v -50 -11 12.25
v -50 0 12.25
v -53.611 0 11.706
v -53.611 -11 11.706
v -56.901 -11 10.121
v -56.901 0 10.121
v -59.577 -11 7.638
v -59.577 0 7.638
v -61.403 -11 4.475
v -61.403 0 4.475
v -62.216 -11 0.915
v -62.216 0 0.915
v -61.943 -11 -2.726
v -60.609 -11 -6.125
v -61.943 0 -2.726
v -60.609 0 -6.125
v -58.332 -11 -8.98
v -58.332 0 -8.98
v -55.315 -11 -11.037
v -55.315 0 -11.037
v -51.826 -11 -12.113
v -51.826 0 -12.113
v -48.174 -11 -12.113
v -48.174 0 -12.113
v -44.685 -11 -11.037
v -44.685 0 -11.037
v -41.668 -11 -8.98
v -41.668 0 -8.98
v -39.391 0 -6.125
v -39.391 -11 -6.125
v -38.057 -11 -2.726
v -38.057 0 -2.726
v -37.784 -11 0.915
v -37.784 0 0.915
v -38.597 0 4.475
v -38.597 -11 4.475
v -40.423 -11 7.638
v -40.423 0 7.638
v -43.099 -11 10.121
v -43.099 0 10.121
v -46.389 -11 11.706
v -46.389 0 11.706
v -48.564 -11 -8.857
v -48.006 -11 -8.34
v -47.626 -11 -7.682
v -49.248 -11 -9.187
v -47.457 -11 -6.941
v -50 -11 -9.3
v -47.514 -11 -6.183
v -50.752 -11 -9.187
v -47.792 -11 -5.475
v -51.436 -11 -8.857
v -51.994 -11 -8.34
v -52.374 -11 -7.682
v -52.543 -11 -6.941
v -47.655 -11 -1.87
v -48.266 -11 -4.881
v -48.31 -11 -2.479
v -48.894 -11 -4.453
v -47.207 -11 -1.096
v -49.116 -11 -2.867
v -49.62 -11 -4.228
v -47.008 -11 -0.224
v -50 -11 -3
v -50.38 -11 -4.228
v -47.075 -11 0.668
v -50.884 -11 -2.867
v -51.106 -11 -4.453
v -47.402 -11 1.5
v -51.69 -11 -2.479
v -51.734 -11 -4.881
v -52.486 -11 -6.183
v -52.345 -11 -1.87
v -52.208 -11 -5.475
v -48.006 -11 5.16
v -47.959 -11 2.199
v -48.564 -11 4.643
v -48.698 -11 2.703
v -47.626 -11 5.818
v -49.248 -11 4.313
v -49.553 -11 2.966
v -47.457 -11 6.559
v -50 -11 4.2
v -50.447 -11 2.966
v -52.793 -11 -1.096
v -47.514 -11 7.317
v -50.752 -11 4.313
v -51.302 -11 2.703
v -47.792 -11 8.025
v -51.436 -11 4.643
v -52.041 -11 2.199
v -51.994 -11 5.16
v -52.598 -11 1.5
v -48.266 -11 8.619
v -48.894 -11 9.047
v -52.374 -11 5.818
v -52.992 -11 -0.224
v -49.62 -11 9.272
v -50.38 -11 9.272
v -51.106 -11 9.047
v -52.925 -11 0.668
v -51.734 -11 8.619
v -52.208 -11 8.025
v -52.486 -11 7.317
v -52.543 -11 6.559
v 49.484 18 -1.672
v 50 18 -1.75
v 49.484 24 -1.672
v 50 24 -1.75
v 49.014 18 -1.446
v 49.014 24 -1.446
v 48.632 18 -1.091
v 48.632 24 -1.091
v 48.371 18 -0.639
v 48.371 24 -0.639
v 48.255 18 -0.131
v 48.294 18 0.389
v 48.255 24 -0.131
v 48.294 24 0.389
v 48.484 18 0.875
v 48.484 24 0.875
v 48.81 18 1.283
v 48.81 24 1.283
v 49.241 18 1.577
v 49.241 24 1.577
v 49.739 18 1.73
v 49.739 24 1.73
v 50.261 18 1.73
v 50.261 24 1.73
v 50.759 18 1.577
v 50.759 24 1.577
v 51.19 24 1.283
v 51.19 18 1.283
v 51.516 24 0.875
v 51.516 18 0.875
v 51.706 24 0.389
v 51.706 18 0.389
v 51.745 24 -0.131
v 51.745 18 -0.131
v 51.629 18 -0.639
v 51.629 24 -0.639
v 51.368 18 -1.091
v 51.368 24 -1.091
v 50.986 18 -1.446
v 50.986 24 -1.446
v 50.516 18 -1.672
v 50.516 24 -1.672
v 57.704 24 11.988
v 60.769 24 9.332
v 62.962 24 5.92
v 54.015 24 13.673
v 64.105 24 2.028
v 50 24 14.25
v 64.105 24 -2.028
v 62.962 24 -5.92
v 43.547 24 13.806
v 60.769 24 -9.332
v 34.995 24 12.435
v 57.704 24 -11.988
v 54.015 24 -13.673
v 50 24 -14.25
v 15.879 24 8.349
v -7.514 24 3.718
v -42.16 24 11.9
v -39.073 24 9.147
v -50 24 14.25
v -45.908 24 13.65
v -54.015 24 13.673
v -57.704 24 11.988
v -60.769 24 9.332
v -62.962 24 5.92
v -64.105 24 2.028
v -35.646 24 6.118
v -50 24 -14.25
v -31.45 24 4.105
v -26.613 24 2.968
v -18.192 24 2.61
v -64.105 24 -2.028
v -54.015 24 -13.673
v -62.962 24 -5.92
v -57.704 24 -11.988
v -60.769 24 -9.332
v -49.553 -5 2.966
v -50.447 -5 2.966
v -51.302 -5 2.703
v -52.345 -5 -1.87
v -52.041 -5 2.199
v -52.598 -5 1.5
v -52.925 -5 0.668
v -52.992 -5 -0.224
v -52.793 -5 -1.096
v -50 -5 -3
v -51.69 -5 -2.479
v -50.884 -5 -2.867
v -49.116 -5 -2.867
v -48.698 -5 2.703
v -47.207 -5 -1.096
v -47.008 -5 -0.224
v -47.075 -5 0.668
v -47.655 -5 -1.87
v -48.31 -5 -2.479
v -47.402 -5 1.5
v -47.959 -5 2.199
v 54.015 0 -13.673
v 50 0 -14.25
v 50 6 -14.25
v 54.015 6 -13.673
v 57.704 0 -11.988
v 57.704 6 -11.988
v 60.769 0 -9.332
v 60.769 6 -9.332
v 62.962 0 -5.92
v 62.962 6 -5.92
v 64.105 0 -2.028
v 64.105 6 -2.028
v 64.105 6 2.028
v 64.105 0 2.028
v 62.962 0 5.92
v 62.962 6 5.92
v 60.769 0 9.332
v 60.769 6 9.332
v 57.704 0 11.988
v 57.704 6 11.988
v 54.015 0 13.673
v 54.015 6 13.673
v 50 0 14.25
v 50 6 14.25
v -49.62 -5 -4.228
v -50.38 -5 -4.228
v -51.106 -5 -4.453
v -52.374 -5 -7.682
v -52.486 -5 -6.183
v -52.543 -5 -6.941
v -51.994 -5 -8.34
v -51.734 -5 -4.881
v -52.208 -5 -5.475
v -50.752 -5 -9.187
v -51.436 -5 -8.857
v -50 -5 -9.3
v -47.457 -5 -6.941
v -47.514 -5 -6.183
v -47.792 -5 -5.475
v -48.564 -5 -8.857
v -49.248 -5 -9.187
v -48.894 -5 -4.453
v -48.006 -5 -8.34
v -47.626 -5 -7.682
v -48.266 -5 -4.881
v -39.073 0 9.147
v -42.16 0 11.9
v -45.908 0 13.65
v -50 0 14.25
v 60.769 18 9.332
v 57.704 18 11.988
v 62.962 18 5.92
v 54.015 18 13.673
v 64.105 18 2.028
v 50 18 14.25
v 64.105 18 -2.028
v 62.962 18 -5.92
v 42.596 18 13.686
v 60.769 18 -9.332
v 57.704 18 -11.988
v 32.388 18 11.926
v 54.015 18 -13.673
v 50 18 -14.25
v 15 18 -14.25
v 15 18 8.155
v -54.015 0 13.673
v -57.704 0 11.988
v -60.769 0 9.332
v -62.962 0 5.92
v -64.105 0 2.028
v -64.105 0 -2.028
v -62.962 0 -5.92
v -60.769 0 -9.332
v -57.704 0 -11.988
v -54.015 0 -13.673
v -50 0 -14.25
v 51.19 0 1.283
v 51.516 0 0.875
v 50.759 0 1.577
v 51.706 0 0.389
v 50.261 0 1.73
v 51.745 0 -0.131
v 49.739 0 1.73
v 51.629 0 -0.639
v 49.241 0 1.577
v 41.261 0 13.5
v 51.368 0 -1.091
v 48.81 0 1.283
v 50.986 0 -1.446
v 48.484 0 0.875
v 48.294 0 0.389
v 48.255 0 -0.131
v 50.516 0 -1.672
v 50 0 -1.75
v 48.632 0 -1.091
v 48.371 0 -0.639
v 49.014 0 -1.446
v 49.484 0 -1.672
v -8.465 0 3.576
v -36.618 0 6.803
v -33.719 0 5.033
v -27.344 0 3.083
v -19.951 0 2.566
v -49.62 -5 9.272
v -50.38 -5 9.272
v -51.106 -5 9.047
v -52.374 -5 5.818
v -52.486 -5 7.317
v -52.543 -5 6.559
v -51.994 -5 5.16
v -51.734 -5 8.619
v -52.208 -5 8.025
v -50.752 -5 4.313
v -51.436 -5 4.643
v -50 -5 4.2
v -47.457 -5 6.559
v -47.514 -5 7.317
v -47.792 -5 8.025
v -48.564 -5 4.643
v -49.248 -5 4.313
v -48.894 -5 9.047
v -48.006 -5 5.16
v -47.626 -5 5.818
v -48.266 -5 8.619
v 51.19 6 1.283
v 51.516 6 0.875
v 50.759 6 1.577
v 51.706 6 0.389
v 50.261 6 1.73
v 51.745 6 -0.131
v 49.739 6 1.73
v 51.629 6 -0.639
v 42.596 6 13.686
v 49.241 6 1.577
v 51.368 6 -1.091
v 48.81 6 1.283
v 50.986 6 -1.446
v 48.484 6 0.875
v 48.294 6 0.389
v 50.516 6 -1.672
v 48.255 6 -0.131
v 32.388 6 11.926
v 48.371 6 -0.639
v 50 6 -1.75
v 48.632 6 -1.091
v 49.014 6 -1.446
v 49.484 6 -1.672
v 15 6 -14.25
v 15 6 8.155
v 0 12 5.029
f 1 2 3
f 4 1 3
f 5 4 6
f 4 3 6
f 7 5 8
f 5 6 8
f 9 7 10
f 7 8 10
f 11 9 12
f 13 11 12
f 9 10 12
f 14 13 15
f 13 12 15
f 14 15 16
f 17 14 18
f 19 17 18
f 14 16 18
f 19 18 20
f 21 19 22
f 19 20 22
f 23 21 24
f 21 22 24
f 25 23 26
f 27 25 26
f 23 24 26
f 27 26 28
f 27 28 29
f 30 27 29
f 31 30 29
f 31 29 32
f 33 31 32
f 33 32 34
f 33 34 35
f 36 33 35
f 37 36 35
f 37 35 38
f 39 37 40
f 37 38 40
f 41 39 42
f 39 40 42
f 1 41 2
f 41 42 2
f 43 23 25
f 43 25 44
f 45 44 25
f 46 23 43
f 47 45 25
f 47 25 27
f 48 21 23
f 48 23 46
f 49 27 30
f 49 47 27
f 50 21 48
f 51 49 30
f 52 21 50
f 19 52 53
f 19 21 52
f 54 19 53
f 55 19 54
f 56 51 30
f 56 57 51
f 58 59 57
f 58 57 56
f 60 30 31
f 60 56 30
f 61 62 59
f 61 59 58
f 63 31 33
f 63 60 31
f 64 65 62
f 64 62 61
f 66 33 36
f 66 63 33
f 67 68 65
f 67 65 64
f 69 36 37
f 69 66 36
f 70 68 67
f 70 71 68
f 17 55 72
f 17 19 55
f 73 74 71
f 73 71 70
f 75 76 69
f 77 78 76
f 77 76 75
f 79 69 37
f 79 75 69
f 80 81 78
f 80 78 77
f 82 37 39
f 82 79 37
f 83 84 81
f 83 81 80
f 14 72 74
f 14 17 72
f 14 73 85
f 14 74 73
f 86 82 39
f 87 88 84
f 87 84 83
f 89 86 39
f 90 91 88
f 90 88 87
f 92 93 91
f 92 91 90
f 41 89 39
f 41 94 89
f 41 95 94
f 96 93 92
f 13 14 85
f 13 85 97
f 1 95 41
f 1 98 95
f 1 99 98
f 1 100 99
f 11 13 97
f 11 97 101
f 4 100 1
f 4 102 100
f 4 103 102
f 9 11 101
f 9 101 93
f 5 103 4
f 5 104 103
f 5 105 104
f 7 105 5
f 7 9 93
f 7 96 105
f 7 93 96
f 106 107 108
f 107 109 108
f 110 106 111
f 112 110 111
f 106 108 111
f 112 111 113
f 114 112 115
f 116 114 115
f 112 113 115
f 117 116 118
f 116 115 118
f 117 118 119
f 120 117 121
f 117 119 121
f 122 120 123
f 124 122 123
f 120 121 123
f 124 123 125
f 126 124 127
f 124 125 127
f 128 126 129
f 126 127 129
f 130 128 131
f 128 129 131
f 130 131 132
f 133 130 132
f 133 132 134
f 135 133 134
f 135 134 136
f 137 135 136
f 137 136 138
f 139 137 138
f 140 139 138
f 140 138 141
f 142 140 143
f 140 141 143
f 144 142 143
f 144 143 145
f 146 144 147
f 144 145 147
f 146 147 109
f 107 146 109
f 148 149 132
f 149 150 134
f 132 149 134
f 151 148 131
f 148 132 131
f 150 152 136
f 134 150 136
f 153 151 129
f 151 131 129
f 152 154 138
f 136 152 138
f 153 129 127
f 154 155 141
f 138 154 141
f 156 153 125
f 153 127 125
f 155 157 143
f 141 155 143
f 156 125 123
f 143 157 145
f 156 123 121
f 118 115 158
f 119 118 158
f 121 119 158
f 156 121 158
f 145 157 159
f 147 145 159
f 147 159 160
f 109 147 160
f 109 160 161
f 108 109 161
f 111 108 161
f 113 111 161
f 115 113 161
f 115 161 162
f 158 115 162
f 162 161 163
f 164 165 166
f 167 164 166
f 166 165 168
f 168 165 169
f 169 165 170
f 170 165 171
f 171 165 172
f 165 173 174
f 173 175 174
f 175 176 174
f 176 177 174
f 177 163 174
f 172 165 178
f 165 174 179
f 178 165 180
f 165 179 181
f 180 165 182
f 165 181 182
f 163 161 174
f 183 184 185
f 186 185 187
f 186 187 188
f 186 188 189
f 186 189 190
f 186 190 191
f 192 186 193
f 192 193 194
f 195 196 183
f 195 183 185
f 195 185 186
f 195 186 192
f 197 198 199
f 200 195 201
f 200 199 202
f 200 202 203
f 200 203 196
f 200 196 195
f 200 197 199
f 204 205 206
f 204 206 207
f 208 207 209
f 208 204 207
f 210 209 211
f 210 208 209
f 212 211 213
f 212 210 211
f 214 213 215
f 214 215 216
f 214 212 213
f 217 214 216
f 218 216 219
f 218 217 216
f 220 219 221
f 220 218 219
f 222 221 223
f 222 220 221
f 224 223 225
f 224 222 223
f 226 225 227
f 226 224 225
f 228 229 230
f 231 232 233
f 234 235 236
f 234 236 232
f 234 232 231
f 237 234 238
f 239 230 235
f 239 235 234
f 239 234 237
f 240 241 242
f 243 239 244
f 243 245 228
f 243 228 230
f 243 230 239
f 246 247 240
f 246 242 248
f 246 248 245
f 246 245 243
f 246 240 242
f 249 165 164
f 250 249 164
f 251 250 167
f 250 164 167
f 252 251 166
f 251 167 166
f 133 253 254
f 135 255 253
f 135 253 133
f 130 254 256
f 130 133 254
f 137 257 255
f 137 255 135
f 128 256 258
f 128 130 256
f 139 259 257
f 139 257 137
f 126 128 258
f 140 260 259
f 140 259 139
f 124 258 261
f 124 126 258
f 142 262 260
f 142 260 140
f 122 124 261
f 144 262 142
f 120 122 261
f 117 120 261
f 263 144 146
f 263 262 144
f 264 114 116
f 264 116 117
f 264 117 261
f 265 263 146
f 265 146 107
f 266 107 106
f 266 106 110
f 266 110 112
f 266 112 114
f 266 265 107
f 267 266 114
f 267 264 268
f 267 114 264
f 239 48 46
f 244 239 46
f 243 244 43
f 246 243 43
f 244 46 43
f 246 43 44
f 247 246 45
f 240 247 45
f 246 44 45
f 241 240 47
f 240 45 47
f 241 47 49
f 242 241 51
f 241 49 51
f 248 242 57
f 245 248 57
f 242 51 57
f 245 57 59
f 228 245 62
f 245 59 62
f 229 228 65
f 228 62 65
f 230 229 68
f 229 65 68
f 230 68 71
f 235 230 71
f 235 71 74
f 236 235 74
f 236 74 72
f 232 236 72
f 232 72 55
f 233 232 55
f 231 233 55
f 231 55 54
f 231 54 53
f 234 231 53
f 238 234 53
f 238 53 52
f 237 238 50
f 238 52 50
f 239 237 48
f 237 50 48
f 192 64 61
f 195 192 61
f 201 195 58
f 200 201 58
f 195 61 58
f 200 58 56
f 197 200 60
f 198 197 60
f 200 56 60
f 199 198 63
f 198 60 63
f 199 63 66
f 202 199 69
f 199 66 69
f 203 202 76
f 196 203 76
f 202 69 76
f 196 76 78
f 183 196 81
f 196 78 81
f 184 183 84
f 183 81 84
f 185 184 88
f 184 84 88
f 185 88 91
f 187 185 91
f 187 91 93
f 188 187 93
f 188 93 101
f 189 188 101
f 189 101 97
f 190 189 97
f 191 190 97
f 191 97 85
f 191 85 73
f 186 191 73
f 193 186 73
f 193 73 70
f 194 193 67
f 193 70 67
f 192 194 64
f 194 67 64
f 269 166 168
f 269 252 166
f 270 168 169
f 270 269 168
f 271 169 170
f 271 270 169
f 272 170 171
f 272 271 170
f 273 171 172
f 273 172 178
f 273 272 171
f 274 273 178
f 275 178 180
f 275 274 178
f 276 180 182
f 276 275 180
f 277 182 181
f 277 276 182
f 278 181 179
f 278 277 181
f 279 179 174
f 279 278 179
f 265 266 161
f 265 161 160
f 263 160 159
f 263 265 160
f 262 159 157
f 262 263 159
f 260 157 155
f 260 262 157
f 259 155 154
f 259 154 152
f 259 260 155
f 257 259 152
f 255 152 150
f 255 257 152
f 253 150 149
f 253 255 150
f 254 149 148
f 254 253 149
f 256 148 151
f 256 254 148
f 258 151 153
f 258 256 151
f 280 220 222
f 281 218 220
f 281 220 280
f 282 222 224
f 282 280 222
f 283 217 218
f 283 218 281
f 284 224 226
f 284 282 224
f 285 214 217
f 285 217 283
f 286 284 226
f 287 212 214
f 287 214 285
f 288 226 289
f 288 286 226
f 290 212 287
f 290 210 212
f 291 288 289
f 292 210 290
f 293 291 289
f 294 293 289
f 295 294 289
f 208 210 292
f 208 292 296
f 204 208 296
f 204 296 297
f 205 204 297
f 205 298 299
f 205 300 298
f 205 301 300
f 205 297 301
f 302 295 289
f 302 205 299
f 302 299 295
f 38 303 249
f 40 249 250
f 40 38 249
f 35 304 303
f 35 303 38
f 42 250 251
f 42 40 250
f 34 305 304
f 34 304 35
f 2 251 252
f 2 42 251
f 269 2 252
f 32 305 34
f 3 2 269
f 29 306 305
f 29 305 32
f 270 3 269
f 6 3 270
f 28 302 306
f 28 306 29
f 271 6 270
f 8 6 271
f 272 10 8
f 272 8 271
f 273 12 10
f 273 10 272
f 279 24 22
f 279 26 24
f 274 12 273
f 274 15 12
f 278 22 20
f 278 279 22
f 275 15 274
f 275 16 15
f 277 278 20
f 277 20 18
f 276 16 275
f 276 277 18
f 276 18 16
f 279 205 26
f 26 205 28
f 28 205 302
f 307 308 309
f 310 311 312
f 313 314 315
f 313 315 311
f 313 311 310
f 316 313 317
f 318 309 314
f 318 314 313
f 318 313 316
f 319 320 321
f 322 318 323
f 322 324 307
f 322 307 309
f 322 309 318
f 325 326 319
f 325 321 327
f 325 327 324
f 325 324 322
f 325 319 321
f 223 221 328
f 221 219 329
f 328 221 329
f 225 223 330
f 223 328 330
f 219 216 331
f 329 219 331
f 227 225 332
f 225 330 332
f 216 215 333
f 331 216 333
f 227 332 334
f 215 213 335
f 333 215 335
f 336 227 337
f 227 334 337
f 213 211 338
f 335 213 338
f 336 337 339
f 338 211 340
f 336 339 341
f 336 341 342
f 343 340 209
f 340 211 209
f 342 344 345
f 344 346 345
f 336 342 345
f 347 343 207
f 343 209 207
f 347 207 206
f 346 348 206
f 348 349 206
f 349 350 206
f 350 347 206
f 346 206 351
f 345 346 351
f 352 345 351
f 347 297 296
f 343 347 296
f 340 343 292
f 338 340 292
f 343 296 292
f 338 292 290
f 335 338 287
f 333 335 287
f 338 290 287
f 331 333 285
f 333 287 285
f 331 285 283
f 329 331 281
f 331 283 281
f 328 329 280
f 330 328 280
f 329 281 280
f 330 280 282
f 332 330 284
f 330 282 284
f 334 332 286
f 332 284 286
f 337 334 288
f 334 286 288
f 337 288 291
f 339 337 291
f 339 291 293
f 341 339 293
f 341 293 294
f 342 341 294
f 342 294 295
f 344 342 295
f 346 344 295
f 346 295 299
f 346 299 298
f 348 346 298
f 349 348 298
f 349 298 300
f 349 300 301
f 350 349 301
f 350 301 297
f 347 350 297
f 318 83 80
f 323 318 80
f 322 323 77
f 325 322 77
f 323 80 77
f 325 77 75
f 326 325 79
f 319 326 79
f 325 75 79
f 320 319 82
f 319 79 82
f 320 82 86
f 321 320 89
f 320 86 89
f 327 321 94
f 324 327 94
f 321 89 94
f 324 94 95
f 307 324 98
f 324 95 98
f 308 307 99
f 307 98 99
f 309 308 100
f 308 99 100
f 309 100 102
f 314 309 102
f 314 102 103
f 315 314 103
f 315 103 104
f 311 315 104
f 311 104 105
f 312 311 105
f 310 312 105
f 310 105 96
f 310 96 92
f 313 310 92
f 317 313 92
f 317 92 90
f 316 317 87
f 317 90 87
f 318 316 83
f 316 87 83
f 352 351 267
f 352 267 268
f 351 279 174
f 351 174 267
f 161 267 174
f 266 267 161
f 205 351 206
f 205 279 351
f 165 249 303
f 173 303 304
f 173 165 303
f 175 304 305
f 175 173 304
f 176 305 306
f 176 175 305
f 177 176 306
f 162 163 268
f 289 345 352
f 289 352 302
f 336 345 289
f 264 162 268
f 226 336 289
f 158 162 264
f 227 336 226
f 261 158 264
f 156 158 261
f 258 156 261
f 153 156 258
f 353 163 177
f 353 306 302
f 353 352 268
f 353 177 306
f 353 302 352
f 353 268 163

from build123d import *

# Parameters (mm, degrees)
BOSS_EXTRUDE1_DEPTH = 6
SKETCH3_R           = 1.75
CUT_EXTRUDE2_DEPTH  = 67.08422656
BOSS_EXTRUDE2_DEPTH = 12
BOSS_EXTRUDE3_DEPTH = 6
CUT_EXTRUDE3_REACH  = 72.051
SKETCH6_R           = 1.75
CUT_EXTRUDE4_REACH  = 72.051
SKETCH8_R           = 12.25
BOSS_EXTRUDE4_DEPTH = 11
SKETCH9_R           = 2.55
SKETCH9_R_2         = 3
CUT_EXTRUDE5_DEPTH  = 6


with BuildPart() as part:
    # Sketch1 → Boss-Extrude1 (new body)
    with BuildSketch(Plane(origin=(0, 0, 0), x_dir=(1, 0, 0), z_dir=(0, 1, 0))):
        with BuildLine():
            Line((-50, 14.25), (50, 14.25))
            ThreePointArc((50, 14.25), (64.25, 0), (50, -14.25))
            Line((50, -14.25), (-50, -14.25))
            ThreePointArc((-50, -14.25), (-64.25, 0), (-50, 14.25))
        make_face()
    extrude(amount=BOSS_EXTRUDE1_DEPTH)

    # Sketch3 → Cut-Extrude2 (cut, through all)
    with BuildSketch(Plane.XZ):
        with Locations(Location((50, 0, 0), (0, 0, 270))):
            Circle(SKETCH3_R)
    extrude(amount=-CUT_EXTRUDE2_DEPTH, mode=Mode.SUBTRACT)

    # Sketch4 → Boss-Extrude2 (add)
    with BuildSketch(Plane(origin=(0, 6, 0), x_dir=(1, 0, 0), z_dir=(0, 1, 0))):
        with BuildLine():
            Line((-50, 14.25), (15, 14.25))
            Line((15, 14.25), (15, -14.25))
            Line((15, -14.25), (-50, -14.25))
            ThreePointArc((-50, -14.25), (-64.25, 0), (-50, 14.25))
        make_face()
    extrude(amount=BOSS_EXTRUDE2_DEPTH)

    # Sketch5 → Boss-Extrude3 (add)
    with BuildSketch(Plane(origin=(0, 18, 0), x_dir=(1, 0, 0), z_dir=(0, 1, 0))):
        with BuildLine():
            Line((-50, 14.25), (50, 14.25))
            ThreePointArc((50, 14.25), (64.25, 0), (50, -14.25))
            Line((50, -14.25), (-50, -14.25))
            ThreePointArc((-50, -14.25), (-64.25, 0), (-50, 14.25))
        make_face()
    extrude(amount=BOSS_EXTRUDE3_DEPTH)

    # Sketch6 → Cut-Extrude3 (cut, up to next)
    with BuildSketch(Plane(origin=(0, 24, 0), x_dir=(1, 0, 0), z_dir=(0, 1, 0)), mode=Mode.PRIVATE) as cut_extrude3_sk1:
        with Locations(Location((50, 0, 0), (0, 0, 90))):
            Circle(SKETCH6_R)
    cut_extrude3_tool1 = extrude(cut_extrude3_sk1.sketch, amount=-CUT_EXTRUDE3_REACH, mode=Mode.PRIVATE) & part.part
    add(cut_extrude3_tool1.solids().sort_by_distance((50, 24, 0))[0], mode=Mode.SUBTRACT)

    # Sketch7 → Cut-Extrude4 (cut, up to next)
    with BuildSketch(Plane(origin=(0, 24, 0), x_dir=(1, 0, 0), z_dir=(0, 1, 0)), mode=Mode.PRIVATE) as cut_extrude4_sk1:
        with BuildLine():
            ThreePointArc((-39.07315683, -9.146944754), (-43.970135273, -12.911360555), (-50, -14.25))
            Line((-50, -14.25), (50, -14.25))
            add(Edge.make_bspline(
                [(-39.07315683, -9.146944754), (-31.514094033, -0.116968526), (5.438655837, -4.645240543), (38.697514387, -14.25), (50, -14.25)],
                knots=[0, 0, 0, 0, 0.435907903, 1, 1, 1, 1], degree=3))
        make_face()
    cut_extrude4_tool1 = extrude(cut_extrude4_sk1.sketch, amount=-CUT_EXTRUDE4_REACH, mode=Mode.PRIVATE) & part.part
    add(cut_extrude4_tool1.solids().sort_by_distance((-8.590717, 24, 9.791359))[0], mode=Mode.SUBTRACT)

    # Sketch8 → Boss-Extrude4 (add)
    with BuildSketch(Plane.XZ):
        with Locations(Location((-50, 0, 0), (0, 0, 90))):
            Circle(SKETCH8_R)
    extrude(amount=BOSS_EXTRUDE4_DEPTH)

    # Sketch9 → Cut-Extrude5 (cut)
    with BuildSketch(Plane.XZ.offset(11)):
        with Locations(Location((-50, 6.75, 0), (0, 0, 270))):
            Circle(SKETCH9_R)
        with Locations(Location((-50, -6.75, 0), (0, 0, 270))):
            Circle(SKETCH9_R)
        with Locations(Location((-50, 0, 0), (0, 0, 270))):
            Circle(SKETCH9_R_2)
    extrude(amount=-CUT_EXTRUDE5_DEPTH, mode=Mode.SUBTRACT)


solid = part.part
